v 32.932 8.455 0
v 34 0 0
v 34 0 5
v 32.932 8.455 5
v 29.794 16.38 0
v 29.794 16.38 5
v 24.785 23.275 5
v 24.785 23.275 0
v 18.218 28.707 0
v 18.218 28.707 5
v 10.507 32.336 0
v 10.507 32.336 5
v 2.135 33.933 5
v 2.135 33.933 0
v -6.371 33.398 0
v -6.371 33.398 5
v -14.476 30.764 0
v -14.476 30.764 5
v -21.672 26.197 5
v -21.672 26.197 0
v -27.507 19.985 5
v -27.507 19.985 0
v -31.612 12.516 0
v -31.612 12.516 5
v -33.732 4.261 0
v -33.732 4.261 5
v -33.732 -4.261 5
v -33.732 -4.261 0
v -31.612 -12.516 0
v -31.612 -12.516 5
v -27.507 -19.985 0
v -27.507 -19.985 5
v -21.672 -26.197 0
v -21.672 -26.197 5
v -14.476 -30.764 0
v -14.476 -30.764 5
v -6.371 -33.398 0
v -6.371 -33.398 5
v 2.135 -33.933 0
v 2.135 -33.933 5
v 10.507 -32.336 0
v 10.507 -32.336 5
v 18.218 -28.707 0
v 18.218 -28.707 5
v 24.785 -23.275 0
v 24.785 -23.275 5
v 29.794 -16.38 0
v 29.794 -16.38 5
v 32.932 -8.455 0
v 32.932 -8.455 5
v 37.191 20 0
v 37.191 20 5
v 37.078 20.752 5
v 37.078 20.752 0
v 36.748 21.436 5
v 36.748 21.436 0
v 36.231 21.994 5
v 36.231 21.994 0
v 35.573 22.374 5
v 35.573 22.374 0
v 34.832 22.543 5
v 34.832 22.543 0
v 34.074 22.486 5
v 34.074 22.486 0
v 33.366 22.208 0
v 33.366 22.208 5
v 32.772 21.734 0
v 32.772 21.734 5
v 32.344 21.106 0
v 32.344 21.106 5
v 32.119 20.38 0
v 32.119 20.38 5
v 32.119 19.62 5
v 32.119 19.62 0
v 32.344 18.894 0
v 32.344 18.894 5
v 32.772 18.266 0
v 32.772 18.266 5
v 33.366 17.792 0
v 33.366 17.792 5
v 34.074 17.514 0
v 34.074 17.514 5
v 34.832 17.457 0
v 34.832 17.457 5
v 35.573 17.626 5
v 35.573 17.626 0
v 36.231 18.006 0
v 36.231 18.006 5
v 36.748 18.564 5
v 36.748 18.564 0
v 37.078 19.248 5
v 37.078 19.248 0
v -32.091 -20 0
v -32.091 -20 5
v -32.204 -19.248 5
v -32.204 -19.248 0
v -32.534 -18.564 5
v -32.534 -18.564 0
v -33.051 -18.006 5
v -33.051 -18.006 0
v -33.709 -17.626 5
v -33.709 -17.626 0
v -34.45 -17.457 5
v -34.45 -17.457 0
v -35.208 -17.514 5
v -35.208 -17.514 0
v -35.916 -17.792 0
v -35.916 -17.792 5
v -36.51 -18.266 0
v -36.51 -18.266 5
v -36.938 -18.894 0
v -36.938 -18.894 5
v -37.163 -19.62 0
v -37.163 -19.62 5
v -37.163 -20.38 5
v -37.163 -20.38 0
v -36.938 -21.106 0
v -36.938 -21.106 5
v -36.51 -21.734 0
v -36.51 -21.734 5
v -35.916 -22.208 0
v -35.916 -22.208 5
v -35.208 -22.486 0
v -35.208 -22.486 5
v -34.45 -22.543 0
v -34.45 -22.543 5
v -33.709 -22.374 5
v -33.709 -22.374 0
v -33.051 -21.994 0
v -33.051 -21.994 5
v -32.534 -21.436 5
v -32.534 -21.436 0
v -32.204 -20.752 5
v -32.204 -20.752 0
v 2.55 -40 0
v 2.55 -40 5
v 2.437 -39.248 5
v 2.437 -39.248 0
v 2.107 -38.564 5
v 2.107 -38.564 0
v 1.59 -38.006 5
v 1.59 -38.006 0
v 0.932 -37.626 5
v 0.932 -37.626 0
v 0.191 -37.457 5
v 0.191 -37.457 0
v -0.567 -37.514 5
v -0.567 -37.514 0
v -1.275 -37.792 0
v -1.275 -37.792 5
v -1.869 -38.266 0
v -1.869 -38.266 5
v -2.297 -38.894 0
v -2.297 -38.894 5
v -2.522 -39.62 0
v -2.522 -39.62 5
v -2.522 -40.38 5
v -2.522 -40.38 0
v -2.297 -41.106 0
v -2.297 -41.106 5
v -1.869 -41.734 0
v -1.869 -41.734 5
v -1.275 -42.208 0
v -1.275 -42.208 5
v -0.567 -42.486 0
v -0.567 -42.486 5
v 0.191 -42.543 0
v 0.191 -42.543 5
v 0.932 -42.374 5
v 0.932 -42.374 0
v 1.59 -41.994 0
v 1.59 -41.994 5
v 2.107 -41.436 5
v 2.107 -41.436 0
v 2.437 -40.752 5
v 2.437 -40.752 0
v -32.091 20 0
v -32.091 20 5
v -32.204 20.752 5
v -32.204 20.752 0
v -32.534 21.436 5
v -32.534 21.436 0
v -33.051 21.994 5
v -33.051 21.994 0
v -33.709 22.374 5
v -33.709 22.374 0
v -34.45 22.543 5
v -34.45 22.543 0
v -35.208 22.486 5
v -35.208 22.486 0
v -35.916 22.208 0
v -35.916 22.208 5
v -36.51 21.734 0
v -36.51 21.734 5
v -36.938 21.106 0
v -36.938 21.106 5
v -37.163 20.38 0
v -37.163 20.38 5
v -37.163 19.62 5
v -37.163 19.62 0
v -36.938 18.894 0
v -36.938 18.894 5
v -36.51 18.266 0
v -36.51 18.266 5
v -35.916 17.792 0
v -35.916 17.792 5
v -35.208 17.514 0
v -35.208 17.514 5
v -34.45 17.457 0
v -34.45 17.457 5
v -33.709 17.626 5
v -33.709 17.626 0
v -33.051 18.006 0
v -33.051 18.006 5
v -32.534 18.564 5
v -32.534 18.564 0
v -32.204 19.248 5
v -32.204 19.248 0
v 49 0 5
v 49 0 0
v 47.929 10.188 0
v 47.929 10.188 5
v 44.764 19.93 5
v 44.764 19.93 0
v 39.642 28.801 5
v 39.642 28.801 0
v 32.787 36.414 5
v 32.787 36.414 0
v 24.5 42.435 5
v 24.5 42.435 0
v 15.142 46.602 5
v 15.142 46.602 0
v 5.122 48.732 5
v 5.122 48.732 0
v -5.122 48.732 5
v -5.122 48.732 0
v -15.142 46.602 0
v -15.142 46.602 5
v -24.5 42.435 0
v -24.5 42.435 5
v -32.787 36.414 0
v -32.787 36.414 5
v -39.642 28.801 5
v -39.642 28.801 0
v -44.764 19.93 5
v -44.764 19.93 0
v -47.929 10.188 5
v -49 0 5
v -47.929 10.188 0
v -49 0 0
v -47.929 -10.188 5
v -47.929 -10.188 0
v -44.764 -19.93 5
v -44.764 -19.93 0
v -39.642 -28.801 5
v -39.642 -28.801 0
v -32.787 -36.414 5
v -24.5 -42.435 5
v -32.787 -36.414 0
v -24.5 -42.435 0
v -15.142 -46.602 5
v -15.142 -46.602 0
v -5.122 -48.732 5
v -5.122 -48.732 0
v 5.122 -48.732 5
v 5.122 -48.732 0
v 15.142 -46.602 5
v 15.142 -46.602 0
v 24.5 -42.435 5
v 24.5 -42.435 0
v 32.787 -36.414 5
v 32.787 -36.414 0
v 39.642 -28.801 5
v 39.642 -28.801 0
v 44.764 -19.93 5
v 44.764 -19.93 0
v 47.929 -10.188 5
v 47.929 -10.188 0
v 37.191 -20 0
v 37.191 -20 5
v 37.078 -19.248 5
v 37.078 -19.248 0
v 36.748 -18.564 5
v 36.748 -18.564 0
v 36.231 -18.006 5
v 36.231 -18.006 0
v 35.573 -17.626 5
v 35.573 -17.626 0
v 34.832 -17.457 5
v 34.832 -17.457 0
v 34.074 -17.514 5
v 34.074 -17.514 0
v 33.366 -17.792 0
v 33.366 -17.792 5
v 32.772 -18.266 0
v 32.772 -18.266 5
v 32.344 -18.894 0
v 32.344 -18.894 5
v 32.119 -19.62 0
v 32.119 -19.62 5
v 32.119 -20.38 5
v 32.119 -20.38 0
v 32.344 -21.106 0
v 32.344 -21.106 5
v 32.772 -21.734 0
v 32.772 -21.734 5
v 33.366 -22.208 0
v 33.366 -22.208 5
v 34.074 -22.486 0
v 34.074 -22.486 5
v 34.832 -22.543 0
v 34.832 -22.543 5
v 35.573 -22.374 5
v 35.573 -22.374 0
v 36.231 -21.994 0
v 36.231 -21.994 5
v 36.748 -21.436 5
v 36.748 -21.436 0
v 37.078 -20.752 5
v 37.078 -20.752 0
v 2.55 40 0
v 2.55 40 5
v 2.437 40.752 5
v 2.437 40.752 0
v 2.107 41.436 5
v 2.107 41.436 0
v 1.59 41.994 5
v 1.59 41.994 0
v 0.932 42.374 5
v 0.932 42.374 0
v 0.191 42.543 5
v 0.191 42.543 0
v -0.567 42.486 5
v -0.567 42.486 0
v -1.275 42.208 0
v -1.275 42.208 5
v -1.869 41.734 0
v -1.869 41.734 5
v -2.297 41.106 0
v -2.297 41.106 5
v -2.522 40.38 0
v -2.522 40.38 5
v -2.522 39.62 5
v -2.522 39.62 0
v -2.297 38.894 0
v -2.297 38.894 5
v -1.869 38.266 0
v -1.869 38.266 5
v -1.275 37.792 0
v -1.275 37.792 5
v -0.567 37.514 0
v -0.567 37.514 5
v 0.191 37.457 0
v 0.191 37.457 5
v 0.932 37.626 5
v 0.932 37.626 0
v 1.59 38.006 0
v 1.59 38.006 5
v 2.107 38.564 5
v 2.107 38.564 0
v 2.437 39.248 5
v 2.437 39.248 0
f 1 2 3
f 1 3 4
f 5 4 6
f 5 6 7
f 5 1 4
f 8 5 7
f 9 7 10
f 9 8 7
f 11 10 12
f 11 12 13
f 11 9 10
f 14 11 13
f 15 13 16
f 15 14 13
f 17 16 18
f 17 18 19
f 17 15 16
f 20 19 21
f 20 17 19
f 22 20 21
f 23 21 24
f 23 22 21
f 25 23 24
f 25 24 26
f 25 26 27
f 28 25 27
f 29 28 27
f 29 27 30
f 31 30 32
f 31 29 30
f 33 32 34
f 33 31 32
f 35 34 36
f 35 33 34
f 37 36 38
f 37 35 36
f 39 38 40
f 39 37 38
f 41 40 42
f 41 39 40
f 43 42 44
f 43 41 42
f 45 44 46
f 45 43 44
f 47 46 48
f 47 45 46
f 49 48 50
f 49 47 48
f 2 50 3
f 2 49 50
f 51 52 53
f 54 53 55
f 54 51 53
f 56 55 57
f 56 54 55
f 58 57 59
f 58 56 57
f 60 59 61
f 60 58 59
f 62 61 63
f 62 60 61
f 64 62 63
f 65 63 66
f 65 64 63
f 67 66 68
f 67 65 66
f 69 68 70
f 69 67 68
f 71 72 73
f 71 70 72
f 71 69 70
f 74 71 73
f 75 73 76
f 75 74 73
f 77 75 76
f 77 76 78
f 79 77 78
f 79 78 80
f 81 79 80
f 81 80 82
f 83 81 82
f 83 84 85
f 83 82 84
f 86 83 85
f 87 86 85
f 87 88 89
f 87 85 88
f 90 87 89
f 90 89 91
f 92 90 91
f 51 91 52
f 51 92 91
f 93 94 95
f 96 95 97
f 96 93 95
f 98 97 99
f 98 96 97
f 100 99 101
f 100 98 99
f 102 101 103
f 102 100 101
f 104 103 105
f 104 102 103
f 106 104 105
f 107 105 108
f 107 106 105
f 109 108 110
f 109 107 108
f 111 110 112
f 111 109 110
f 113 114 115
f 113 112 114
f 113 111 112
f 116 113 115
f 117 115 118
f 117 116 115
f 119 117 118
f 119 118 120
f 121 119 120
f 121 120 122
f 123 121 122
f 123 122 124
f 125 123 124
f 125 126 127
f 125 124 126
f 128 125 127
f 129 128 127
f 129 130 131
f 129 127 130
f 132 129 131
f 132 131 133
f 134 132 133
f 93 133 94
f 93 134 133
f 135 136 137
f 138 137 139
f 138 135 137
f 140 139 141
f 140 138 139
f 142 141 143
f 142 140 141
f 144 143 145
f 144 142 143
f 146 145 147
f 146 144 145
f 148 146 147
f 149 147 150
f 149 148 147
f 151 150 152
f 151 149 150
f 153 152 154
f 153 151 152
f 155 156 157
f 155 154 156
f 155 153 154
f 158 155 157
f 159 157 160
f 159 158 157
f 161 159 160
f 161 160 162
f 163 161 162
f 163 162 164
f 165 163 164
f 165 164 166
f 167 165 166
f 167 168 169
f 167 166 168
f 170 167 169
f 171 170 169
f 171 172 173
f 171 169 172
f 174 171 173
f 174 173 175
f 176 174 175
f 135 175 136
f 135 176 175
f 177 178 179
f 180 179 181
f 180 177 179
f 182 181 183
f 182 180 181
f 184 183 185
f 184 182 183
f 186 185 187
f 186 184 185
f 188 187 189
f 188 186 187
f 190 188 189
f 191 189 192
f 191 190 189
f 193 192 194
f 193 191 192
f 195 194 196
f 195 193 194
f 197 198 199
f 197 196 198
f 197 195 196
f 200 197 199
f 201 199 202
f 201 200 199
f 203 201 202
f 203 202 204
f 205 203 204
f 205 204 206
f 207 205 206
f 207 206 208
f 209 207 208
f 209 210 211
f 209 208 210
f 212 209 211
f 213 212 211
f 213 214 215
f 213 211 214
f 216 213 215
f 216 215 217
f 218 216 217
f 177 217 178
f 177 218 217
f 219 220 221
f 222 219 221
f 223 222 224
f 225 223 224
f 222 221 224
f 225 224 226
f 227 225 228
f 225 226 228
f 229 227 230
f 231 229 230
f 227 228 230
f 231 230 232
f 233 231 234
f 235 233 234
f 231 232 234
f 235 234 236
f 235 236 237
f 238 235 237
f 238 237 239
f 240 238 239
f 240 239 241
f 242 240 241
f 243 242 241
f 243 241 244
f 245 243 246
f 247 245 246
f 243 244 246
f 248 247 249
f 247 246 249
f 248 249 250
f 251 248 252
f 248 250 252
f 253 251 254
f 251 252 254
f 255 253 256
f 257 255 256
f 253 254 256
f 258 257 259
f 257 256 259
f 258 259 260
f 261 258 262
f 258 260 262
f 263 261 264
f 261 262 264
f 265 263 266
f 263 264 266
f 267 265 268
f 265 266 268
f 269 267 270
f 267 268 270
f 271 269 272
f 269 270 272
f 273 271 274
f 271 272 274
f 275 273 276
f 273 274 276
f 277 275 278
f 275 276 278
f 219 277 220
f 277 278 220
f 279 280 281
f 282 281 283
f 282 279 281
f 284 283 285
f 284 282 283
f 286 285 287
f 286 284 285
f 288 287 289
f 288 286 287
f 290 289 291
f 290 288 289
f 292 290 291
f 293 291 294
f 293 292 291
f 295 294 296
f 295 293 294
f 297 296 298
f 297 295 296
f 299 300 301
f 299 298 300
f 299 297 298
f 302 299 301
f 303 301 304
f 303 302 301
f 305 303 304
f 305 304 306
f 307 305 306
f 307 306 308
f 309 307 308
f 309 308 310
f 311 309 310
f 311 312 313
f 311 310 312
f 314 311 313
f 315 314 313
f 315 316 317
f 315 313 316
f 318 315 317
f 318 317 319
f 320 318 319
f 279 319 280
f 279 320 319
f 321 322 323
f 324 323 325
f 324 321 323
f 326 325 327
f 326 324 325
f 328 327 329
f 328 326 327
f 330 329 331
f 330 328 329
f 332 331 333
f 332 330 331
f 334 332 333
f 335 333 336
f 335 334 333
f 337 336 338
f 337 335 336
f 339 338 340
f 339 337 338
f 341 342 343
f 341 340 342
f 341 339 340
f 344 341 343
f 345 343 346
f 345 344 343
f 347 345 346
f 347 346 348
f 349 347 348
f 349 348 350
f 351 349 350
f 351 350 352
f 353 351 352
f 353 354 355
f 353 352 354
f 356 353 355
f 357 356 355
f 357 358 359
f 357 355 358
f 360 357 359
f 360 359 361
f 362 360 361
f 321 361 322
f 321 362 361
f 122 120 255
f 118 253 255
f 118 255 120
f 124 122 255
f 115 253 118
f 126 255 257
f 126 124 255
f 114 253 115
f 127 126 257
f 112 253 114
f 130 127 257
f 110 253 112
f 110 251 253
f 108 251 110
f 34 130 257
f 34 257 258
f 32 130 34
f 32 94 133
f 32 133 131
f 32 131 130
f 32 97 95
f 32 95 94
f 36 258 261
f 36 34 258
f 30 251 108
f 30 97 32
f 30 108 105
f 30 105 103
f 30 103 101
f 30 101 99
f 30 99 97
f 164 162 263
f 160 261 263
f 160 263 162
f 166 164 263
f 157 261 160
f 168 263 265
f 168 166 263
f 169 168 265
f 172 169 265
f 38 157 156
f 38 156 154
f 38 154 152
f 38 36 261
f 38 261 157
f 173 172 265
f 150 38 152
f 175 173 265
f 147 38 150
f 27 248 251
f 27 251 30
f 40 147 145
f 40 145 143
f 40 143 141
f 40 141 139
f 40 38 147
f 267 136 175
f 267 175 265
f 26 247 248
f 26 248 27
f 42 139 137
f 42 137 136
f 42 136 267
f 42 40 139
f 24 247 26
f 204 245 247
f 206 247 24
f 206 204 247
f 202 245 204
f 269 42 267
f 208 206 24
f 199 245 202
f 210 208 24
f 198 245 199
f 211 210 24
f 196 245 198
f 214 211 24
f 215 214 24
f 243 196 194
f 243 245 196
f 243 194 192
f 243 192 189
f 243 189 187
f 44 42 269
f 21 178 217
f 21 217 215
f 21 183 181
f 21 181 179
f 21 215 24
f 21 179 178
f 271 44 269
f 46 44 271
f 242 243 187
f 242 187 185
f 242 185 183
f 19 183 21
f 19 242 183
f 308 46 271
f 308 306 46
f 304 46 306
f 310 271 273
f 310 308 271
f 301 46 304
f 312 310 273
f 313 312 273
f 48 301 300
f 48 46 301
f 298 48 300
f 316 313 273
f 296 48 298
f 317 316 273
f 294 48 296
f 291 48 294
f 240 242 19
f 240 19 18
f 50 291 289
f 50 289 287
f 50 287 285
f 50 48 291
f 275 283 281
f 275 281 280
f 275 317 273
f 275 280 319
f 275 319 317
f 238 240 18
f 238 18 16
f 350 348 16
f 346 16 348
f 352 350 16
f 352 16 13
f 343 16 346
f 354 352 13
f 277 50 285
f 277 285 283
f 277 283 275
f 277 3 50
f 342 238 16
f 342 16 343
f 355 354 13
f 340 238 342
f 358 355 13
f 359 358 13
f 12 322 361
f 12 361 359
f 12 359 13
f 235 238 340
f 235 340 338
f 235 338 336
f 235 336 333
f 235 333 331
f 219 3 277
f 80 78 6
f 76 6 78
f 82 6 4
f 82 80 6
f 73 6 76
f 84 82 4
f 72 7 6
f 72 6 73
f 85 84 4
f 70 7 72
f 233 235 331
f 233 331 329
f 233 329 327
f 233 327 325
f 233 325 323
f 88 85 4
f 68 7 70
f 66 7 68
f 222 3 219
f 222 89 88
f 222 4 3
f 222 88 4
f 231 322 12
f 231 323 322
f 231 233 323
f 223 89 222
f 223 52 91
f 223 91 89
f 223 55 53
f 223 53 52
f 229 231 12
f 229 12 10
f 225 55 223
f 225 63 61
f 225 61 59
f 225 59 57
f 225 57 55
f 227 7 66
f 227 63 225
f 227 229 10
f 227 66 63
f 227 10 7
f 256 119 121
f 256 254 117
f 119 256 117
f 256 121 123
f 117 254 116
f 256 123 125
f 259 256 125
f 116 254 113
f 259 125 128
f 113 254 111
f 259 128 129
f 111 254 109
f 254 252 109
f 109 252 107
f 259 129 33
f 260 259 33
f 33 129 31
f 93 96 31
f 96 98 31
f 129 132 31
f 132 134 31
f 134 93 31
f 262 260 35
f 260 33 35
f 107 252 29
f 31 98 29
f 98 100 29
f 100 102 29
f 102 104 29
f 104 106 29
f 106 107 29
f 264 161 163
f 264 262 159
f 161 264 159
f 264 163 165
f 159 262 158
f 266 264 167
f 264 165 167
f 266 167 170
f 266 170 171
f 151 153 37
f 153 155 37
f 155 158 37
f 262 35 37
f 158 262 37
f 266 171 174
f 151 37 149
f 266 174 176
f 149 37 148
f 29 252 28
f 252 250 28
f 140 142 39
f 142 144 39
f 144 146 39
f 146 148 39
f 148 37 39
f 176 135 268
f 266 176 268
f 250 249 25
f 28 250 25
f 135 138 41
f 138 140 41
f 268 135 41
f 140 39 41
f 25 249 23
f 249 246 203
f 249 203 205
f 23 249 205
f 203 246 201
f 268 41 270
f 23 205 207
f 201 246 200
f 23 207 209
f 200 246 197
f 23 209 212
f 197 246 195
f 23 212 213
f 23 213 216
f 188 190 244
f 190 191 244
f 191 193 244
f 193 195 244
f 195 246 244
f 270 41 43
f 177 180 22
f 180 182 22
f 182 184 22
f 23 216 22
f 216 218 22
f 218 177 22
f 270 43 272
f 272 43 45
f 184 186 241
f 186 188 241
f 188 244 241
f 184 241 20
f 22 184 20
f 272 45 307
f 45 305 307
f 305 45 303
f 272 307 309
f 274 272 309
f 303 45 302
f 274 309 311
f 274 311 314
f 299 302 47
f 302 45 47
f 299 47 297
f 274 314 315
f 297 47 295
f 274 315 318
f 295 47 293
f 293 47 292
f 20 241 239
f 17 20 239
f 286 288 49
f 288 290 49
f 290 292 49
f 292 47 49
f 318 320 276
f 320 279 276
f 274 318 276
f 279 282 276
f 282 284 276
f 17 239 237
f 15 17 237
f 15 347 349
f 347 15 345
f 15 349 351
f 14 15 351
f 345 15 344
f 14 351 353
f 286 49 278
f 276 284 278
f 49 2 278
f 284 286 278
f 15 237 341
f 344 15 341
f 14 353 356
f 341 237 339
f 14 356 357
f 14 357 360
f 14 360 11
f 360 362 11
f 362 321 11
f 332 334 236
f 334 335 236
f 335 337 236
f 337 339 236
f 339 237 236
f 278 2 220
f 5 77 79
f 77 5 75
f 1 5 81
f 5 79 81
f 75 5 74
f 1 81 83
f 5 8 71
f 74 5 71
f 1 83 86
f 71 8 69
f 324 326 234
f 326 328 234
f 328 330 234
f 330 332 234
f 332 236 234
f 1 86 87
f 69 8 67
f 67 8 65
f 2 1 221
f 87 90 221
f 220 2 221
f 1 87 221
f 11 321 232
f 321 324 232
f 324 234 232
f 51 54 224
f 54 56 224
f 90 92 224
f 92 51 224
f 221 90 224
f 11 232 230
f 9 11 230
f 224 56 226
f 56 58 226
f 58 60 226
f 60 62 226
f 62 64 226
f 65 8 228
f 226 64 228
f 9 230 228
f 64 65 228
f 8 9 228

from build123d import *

# Parameters (mm, degrees)
SKETCH1_R           = 49
SKETCH1_R_2         = 34
BOSS_EXTRUDE1_DEPTH = 5
SKETCH2_R           = 2.55
CUT_EXTRUDE1_DEPTH  = 70.476614771


with BuildPart() as part:
    # Sketch1 → Boss-Extrude1 (new body)
    with BuildSketch(Plane.XY):
        Circle(SKETCH1_R)
        Circle(SKETCH1_R_2, mode=Mode.SUBTRACT)
    extrude(amount=BOSS_EXTRUDE1_DEPTH)

    # Sketch2 → Cut-Extrude1 (cut, through all)
    with BuildSketch(Plane.XY):
        with Locations((0, 40)):
            Circle(SKETCH2_R)
        with Locations((34.641016151, 20)):
            Circle(SKETCH2_R)
        with Locations((34.641016151, -20)):
            Circle(SKETCH2_R)
        with Locations((0, -40)):
            Circle(SKETCH2_R)
        with Locations((-34.641016151, -20)):
            Circle(SKETCH2_R)
        with Locations((-34.641016151, 20)):
            Circle(SKETCH2_R)
    extrude(amount=CUT_EXTRUDE1_DEPTH, mode=Mode.SUBTRACT)


solid = part.part
